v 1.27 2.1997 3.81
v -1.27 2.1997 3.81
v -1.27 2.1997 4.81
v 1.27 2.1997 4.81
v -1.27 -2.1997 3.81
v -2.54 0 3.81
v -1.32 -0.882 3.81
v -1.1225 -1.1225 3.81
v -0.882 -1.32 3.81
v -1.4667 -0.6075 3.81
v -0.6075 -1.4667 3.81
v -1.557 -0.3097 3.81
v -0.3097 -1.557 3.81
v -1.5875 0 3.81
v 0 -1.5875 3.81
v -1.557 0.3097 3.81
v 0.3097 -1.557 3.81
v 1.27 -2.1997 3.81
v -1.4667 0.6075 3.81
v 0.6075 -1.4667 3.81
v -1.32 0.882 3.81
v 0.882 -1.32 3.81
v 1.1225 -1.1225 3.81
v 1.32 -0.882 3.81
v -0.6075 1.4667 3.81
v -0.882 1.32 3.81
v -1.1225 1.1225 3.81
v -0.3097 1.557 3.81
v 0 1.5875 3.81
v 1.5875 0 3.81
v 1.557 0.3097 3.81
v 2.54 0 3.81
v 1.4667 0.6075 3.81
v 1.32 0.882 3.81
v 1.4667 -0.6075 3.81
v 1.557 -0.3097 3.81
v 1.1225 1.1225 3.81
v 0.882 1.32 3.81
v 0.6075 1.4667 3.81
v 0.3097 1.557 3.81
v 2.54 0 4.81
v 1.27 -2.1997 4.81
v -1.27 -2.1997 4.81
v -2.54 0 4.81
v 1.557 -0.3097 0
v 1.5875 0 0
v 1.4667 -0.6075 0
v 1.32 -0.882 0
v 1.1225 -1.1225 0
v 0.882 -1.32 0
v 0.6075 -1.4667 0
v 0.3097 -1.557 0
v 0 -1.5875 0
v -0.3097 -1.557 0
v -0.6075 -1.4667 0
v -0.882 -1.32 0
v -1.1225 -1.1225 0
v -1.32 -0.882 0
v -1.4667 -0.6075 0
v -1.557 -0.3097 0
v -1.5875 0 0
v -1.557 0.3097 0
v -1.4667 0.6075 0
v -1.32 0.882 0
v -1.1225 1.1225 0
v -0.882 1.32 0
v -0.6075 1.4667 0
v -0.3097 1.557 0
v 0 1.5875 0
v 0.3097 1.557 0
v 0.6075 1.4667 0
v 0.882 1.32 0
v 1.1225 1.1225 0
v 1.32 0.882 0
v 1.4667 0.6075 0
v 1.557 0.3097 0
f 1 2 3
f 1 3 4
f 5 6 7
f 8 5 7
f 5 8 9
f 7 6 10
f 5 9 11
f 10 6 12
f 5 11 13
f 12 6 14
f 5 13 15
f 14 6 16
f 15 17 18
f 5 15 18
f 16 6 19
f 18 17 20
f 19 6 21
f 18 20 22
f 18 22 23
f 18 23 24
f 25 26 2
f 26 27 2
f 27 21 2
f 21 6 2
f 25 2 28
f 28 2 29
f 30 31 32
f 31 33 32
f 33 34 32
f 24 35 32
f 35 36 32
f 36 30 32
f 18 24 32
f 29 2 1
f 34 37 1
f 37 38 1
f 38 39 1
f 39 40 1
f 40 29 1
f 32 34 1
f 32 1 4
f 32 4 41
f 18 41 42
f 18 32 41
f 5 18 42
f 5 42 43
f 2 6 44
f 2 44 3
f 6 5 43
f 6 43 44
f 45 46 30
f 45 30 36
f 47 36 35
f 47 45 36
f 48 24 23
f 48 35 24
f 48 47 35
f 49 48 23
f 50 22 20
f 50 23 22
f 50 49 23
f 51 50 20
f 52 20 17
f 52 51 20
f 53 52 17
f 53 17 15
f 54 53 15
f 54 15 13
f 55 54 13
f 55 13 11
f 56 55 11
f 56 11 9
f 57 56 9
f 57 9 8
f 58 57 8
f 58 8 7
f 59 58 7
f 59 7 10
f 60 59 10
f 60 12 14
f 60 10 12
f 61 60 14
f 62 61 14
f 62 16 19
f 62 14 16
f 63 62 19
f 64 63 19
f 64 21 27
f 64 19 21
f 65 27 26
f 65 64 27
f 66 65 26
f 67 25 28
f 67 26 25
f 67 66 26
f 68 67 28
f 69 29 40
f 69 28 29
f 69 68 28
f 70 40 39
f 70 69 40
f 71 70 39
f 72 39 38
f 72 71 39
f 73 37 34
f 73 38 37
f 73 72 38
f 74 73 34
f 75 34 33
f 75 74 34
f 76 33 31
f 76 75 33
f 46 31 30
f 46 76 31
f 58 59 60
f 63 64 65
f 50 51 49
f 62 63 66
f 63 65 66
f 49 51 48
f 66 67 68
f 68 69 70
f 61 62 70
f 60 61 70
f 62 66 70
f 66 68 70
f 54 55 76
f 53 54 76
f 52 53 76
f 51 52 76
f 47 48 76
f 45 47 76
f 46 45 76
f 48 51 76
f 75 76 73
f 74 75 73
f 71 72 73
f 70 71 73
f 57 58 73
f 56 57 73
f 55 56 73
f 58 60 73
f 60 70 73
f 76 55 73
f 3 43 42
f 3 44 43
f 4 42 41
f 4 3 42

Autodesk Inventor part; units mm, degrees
ref_plane "YZ Plane" through (0, 0, 0) normal (1, 0, 0) x (0, 1, 0)
ref_plane "XZ Plane" through (0, 0, 0) normal (0, 1, 0) x (-1, 0, 0)
ref_plane "XY Plane" through (0, 0, 0) normal (0, 0, 1) x (1, 0, 0)
sketch "Sketch1" plane through (0, 0, 0) normal (0, 0, 1) x (1, 0, 0)
  circle A0 centre (0, 0) radius 1.5875
  dimension "d0" = 3.175
extrude "Extrusion1" add sketch "Sketch1" along normal blind 3.81
sketch "Sketch2" plane through (0, 0, 3.81) normal (0, 0, 1) x (1, 0, 0)
  line L0 (2.54, 0) -> (1.27, -2.1997)
  line L1 (1.27, -2.1997) -> (-1.27, -2.1997)
  line L2 (-1.27, -2.1997) -> (-2.54, 0)
  line L3 (-2.54, 0) -> (-1.27, 2.1997)
  line L4 (-1.27, 2.1997) -> (1.27, 2.1997)
  line L5 (1.27, 2.1997) -> (2.54, 0)
  point P0 (0, 0)
  point P1 (0, 0)
  dimension "d5" = 5.08
extrude "Extrusion2" add sketch "Sketch2" along normal blind 1
thread "Thread1" size "5-40 UNC" class "2A" standard "ANSI Unified Screw Threads" full length
properties part number "Pedal Bar Bolt"
